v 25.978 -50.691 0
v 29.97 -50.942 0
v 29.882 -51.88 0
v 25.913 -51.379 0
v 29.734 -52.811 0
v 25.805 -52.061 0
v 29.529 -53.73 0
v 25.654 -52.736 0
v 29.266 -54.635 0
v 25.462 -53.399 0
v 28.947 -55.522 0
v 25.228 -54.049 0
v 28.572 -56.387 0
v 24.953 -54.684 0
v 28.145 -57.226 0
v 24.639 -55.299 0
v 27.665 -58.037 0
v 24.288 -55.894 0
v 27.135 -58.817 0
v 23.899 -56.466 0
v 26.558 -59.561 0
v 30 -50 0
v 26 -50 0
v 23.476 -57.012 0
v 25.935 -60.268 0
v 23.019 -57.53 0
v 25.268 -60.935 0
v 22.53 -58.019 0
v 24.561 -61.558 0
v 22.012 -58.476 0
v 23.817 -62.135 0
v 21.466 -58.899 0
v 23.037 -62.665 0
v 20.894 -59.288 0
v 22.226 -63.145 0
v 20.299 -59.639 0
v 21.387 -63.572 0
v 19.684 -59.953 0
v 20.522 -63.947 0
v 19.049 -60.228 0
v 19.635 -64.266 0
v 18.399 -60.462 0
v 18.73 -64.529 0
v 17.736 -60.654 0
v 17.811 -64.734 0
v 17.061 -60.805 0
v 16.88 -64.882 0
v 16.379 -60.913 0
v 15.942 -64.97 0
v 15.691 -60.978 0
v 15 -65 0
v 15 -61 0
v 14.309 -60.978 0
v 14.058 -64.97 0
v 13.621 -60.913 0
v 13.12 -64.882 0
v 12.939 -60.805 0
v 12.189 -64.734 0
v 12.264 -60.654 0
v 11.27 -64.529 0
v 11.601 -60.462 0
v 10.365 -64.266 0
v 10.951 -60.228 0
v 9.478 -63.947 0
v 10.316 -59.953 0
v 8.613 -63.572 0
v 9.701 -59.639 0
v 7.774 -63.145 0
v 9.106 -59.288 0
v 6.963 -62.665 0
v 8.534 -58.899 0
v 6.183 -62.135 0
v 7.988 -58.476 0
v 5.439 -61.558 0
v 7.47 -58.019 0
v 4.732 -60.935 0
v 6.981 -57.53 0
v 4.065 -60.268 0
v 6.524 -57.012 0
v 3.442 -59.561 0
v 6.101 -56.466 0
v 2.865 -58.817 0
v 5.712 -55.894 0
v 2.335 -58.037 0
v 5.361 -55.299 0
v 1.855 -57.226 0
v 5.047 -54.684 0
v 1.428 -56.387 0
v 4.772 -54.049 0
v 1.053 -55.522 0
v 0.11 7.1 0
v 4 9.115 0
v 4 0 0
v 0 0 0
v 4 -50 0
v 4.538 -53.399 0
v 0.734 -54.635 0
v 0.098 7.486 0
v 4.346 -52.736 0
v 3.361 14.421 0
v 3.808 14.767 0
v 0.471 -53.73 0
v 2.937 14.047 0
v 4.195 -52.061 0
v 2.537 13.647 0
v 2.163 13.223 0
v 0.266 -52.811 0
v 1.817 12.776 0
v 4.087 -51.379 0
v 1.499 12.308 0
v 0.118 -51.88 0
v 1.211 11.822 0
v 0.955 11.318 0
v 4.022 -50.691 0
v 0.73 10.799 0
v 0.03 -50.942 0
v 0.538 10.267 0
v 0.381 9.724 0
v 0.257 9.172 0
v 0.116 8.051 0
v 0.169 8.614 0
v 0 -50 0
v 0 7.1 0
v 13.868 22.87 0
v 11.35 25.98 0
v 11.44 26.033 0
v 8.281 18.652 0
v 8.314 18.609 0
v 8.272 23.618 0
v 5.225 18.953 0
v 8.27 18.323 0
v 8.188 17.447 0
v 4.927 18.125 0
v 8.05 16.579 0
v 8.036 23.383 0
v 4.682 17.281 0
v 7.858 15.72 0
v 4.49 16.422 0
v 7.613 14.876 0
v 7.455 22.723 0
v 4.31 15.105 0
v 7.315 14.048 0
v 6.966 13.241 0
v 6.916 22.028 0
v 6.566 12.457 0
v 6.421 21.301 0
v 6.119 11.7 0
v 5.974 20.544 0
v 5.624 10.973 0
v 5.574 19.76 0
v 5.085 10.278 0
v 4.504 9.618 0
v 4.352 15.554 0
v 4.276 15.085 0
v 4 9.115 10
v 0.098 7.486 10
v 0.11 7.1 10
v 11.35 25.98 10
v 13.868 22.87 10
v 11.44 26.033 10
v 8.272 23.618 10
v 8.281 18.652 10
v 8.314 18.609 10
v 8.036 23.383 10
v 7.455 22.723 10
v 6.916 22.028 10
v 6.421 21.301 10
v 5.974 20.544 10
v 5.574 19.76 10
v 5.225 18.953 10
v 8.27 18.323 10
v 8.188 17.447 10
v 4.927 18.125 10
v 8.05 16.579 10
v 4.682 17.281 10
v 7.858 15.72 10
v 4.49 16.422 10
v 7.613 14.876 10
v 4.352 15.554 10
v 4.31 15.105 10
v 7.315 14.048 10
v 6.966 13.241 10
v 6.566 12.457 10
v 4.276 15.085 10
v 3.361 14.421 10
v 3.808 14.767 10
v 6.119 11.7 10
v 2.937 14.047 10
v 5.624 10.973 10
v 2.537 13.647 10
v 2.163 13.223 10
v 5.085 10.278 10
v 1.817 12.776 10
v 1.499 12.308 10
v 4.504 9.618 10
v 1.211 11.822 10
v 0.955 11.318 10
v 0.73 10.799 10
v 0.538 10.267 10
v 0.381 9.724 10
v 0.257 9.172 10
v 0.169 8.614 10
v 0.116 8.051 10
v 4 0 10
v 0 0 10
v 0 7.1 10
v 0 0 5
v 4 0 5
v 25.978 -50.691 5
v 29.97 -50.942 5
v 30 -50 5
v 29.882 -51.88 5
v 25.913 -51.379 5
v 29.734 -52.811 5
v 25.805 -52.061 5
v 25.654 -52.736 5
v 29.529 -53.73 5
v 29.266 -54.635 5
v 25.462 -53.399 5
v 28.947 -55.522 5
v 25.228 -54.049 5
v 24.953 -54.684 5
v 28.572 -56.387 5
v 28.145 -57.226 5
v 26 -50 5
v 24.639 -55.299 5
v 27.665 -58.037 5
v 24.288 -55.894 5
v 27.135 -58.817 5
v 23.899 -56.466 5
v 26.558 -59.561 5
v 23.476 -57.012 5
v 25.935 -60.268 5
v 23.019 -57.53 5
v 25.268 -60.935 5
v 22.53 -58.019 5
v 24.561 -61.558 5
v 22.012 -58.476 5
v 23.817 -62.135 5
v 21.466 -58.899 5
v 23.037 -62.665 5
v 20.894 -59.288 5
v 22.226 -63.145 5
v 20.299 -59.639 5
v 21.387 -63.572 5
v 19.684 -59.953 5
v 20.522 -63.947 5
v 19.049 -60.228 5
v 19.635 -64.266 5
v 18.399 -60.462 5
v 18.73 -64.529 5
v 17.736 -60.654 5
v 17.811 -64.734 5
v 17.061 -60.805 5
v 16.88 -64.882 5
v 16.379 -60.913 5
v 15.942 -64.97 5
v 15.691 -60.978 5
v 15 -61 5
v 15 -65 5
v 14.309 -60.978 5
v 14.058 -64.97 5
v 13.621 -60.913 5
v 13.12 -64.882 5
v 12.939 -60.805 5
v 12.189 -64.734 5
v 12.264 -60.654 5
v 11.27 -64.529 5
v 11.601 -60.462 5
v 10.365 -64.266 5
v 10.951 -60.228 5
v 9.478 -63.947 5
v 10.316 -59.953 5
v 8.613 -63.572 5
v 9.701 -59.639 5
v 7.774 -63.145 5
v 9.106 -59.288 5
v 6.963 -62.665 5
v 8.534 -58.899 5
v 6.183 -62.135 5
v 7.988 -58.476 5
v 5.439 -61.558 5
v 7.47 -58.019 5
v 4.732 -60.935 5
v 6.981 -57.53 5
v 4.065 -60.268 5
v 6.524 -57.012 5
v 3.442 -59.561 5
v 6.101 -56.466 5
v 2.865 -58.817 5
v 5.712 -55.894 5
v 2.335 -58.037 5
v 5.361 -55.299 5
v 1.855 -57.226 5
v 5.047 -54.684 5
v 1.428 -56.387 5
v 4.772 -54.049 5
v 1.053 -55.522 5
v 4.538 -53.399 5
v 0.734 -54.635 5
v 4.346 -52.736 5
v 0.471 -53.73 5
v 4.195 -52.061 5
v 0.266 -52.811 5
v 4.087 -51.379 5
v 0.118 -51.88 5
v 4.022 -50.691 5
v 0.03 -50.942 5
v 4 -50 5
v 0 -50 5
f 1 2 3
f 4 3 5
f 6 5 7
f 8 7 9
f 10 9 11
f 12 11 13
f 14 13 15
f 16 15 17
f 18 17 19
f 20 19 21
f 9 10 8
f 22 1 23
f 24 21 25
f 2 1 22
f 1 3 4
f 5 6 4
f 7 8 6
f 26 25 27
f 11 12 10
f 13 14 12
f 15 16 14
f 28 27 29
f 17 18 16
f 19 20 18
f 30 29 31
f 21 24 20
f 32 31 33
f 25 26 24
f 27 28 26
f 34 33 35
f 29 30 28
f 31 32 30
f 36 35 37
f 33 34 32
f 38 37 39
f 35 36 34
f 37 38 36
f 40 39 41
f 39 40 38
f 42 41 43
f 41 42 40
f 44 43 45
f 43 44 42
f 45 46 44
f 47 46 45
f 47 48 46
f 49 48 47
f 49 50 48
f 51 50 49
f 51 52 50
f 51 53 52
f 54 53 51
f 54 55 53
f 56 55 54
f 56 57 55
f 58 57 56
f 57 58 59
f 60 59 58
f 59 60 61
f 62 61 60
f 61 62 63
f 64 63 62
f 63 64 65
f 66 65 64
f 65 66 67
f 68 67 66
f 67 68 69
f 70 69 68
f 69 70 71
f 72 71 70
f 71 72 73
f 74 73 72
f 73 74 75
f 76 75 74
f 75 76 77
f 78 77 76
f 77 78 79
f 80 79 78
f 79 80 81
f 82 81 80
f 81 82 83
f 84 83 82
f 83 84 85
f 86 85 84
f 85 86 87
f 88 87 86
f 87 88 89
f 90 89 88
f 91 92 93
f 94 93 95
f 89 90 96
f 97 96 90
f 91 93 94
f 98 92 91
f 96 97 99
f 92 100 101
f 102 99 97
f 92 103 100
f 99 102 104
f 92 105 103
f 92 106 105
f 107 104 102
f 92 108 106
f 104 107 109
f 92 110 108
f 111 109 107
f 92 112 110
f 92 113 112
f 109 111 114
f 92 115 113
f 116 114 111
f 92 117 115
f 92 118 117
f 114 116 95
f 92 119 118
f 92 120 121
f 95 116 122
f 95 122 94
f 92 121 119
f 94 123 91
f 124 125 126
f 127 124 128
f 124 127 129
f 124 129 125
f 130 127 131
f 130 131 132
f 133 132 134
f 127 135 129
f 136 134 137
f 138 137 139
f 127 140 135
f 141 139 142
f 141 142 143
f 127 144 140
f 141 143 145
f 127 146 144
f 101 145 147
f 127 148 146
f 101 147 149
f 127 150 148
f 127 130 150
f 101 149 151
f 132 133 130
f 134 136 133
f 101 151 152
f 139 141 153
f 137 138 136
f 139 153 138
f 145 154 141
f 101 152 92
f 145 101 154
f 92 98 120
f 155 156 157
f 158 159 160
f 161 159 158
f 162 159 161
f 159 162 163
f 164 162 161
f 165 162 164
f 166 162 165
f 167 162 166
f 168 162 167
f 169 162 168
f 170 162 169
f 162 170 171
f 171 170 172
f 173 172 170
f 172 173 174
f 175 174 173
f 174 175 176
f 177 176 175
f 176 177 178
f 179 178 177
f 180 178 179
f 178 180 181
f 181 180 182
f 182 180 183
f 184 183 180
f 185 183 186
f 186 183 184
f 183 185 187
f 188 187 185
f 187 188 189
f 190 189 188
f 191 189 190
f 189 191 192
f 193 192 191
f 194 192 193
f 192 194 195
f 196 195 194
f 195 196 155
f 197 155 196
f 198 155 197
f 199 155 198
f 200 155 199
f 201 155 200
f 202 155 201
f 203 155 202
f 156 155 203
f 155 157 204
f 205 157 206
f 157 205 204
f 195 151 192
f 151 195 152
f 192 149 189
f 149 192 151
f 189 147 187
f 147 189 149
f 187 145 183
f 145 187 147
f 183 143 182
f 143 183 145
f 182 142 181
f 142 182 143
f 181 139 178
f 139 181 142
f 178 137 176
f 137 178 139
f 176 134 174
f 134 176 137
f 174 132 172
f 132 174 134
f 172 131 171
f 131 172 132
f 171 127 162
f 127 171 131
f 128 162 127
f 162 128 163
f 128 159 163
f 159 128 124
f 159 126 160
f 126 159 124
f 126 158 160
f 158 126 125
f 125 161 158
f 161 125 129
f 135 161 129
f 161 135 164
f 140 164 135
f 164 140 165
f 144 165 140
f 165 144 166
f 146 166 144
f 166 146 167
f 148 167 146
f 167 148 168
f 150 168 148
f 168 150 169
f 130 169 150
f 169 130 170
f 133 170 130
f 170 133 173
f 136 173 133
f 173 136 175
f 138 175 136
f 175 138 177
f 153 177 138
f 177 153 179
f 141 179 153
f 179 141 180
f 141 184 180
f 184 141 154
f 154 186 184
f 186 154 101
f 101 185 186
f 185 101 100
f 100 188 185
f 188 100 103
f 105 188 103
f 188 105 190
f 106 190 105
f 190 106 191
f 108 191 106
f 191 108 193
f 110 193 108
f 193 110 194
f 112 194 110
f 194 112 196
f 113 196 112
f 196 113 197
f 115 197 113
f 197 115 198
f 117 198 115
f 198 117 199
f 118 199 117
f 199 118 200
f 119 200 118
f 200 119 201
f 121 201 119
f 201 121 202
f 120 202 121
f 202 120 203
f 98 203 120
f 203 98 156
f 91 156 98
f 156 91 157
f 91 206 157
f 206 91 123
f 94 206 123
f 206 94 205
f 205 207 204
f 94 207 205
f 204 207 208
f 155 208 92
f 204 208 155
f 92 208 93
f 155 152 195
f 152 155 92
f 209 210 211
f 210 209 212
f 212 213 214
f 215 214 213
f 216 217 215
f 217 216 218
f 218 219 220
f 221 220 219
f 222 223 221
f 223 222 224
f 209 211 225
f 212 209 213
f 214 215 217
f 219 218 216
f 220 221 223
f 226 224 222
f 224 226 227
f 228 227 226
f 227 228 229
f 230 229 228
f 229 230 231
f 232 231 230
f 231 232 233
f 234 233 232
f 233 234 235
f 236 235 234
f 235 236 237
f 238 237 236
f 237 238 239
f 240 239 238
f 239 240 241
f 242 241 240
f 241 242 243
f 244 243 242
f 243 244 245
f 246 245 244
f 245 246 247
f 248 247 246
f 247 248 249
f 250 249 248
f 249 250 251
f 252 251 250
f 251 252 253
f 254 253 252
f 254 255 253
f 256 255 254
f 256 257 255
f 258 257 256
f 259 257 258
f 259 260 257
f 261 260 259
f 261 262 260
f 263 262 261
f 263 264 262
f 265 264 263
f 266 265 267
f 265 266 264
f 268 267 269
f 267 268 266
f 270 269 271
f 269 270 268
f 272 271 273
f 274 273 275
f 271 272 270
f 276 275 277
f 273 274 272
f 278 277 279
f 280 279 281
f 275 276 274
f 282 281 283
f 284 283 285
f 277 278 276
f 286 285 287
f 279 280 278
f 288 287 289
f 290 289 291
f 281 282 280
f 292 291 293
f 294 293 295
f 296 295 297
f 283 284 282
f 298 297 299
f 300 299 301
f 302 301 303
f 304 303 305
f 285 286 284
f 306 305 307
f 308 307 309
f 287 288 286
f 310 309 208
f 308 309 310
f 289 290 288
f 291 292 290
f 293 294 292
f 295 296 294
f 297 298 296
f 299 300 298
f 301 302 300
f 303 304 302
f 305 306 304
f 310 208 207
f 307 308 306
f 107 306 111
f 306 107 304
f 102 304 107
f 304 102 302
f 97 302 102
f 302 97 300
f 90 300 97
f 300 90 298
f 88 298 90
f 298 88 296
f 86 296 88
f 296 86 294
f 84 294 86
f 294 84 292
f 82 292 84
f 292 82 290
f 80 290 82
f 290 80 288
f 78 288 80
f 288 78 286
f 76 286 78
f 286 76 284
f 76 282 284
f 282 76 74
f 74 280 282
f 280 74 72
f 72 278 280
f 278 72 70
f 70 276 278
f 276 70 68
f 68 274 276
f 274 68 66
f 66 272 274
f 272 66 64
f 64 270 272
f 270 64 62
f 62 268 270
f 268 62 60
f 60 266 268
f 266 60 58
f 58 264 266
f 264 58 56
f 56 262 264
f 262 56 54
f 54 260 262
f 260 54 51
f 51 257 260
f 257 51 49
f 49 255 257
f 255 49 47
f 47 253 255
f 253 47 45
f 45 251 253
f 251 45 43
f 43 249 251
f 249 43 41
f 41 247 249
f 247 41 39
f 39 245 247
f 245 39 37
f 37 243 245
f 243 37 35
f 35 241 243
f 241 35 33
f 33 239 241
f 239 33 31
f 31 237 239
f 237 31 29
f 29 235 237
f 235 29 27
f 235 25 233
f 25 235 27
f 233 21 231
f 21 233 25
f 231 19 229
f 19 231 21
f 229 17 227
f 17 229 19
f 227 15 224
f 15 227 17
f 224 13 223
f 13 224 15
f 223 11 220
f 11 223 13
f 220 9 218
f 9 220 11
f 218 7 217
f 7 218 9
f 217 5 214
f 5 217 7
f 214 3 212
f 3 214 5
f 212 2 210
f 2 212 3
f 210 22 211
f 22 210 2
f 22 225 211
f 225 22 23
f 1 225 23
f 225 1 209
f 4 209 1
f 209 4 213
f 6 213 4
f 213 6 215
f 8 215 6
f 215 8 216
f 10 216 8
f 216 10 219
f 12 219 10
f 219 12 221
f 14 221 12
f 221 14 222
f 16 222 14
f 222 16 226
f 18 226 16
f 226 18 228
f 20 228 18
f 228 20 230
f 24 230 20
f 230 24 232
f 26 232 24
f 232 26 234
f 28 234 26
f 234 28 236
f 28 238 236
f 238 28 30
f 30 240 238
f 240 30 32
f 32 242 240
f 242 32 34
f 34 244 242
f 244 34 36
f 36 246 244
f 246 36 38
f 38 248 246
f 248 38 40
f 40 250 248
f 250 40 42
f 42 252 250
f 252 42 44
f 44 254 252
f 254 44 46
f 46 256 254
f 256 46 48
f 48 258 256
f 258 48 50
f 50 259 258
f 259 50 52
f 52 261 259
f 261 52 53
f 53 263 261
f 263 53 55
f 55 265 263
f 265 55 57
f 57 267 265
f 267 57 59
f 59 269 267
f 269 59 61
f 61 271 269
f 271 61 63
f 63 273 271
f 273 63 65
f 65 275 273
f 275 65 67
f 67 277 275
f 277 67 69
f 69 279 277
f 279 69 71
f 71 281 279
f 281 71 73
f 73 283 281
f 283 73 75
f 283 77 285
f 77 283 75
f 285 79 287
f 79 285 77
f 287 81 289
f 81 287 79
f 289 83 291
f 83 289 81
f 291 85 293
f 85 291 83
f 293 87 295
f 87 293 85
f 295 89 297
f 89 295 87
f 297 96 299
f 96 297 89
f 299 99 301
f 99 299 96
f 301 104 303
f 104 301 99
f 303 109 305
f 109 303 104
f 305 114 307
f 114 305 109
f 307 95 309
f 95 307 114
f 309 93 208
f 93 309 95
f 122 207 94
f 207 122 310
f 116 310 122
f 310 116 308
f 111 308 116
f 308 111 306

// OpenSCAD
$fn = 100;

module box_top() {
    translate([25.581, 23.235, 0])
        rotate(a=[0,0,-52.5])
            square([4, 7], center=false);
}

module box_bottom() {
    translate([19.702, 1.453, 0])
        square([4, 7.1], center=false);
}

module box_bottom_long() {
    translate([19.702, 1.453, 0])
        square([4, 15], center=false);
}

module circle_bottom() {
    translate([28.8, 8.939, 0])
        circle(r=9);
}

module circle_middle() {
    translate([14, 20.655, 0])
        circle(r=14);
}

module circle_top() {
    translate([37.944, 15.252, 0])
        circle(r=14);
}

module Kuechenhaken(width) {
    translate([-19.702, -1.453, 0])
        linear_extrude(height = width)
            union() {
                intersection() {
                    box_top();
                    circle_top();
                }
                intersection() {
                    circle_top();
                    circle_middle();
                }
                intersection() {
                    circle_middle();
                    circle_bottom();
                }
                intersection() {
                    circle_bottom();
                    box_bottom_long();
                }
                box_bottom();
            }
}

Kuechenhaken(10);
linear_extrude(height = 5)
    union() {
    translate([0, -50, 0])
        square([4, 50], center=false);
    translate([15, -50, 0])
        difference() {
        circle(d=30);
        circle(d=22);
        translate([-20, 0, 0])
            square([40, 20], center=false);
        }
    }
    
/*    
//scale([1.2, 1, 1])
Kuechenhaken(10);
linear_extrude(height = 5)
    union() {
    translate([0, -40, 0])
        square([4, 40], center=false);
    translate([10, -40, 0])
        difference() {
        circle(d=20);
        circle(d=12);
        translate([-20, 0, 0])
            square([40, 20], center=false);
        }
    }
*/
